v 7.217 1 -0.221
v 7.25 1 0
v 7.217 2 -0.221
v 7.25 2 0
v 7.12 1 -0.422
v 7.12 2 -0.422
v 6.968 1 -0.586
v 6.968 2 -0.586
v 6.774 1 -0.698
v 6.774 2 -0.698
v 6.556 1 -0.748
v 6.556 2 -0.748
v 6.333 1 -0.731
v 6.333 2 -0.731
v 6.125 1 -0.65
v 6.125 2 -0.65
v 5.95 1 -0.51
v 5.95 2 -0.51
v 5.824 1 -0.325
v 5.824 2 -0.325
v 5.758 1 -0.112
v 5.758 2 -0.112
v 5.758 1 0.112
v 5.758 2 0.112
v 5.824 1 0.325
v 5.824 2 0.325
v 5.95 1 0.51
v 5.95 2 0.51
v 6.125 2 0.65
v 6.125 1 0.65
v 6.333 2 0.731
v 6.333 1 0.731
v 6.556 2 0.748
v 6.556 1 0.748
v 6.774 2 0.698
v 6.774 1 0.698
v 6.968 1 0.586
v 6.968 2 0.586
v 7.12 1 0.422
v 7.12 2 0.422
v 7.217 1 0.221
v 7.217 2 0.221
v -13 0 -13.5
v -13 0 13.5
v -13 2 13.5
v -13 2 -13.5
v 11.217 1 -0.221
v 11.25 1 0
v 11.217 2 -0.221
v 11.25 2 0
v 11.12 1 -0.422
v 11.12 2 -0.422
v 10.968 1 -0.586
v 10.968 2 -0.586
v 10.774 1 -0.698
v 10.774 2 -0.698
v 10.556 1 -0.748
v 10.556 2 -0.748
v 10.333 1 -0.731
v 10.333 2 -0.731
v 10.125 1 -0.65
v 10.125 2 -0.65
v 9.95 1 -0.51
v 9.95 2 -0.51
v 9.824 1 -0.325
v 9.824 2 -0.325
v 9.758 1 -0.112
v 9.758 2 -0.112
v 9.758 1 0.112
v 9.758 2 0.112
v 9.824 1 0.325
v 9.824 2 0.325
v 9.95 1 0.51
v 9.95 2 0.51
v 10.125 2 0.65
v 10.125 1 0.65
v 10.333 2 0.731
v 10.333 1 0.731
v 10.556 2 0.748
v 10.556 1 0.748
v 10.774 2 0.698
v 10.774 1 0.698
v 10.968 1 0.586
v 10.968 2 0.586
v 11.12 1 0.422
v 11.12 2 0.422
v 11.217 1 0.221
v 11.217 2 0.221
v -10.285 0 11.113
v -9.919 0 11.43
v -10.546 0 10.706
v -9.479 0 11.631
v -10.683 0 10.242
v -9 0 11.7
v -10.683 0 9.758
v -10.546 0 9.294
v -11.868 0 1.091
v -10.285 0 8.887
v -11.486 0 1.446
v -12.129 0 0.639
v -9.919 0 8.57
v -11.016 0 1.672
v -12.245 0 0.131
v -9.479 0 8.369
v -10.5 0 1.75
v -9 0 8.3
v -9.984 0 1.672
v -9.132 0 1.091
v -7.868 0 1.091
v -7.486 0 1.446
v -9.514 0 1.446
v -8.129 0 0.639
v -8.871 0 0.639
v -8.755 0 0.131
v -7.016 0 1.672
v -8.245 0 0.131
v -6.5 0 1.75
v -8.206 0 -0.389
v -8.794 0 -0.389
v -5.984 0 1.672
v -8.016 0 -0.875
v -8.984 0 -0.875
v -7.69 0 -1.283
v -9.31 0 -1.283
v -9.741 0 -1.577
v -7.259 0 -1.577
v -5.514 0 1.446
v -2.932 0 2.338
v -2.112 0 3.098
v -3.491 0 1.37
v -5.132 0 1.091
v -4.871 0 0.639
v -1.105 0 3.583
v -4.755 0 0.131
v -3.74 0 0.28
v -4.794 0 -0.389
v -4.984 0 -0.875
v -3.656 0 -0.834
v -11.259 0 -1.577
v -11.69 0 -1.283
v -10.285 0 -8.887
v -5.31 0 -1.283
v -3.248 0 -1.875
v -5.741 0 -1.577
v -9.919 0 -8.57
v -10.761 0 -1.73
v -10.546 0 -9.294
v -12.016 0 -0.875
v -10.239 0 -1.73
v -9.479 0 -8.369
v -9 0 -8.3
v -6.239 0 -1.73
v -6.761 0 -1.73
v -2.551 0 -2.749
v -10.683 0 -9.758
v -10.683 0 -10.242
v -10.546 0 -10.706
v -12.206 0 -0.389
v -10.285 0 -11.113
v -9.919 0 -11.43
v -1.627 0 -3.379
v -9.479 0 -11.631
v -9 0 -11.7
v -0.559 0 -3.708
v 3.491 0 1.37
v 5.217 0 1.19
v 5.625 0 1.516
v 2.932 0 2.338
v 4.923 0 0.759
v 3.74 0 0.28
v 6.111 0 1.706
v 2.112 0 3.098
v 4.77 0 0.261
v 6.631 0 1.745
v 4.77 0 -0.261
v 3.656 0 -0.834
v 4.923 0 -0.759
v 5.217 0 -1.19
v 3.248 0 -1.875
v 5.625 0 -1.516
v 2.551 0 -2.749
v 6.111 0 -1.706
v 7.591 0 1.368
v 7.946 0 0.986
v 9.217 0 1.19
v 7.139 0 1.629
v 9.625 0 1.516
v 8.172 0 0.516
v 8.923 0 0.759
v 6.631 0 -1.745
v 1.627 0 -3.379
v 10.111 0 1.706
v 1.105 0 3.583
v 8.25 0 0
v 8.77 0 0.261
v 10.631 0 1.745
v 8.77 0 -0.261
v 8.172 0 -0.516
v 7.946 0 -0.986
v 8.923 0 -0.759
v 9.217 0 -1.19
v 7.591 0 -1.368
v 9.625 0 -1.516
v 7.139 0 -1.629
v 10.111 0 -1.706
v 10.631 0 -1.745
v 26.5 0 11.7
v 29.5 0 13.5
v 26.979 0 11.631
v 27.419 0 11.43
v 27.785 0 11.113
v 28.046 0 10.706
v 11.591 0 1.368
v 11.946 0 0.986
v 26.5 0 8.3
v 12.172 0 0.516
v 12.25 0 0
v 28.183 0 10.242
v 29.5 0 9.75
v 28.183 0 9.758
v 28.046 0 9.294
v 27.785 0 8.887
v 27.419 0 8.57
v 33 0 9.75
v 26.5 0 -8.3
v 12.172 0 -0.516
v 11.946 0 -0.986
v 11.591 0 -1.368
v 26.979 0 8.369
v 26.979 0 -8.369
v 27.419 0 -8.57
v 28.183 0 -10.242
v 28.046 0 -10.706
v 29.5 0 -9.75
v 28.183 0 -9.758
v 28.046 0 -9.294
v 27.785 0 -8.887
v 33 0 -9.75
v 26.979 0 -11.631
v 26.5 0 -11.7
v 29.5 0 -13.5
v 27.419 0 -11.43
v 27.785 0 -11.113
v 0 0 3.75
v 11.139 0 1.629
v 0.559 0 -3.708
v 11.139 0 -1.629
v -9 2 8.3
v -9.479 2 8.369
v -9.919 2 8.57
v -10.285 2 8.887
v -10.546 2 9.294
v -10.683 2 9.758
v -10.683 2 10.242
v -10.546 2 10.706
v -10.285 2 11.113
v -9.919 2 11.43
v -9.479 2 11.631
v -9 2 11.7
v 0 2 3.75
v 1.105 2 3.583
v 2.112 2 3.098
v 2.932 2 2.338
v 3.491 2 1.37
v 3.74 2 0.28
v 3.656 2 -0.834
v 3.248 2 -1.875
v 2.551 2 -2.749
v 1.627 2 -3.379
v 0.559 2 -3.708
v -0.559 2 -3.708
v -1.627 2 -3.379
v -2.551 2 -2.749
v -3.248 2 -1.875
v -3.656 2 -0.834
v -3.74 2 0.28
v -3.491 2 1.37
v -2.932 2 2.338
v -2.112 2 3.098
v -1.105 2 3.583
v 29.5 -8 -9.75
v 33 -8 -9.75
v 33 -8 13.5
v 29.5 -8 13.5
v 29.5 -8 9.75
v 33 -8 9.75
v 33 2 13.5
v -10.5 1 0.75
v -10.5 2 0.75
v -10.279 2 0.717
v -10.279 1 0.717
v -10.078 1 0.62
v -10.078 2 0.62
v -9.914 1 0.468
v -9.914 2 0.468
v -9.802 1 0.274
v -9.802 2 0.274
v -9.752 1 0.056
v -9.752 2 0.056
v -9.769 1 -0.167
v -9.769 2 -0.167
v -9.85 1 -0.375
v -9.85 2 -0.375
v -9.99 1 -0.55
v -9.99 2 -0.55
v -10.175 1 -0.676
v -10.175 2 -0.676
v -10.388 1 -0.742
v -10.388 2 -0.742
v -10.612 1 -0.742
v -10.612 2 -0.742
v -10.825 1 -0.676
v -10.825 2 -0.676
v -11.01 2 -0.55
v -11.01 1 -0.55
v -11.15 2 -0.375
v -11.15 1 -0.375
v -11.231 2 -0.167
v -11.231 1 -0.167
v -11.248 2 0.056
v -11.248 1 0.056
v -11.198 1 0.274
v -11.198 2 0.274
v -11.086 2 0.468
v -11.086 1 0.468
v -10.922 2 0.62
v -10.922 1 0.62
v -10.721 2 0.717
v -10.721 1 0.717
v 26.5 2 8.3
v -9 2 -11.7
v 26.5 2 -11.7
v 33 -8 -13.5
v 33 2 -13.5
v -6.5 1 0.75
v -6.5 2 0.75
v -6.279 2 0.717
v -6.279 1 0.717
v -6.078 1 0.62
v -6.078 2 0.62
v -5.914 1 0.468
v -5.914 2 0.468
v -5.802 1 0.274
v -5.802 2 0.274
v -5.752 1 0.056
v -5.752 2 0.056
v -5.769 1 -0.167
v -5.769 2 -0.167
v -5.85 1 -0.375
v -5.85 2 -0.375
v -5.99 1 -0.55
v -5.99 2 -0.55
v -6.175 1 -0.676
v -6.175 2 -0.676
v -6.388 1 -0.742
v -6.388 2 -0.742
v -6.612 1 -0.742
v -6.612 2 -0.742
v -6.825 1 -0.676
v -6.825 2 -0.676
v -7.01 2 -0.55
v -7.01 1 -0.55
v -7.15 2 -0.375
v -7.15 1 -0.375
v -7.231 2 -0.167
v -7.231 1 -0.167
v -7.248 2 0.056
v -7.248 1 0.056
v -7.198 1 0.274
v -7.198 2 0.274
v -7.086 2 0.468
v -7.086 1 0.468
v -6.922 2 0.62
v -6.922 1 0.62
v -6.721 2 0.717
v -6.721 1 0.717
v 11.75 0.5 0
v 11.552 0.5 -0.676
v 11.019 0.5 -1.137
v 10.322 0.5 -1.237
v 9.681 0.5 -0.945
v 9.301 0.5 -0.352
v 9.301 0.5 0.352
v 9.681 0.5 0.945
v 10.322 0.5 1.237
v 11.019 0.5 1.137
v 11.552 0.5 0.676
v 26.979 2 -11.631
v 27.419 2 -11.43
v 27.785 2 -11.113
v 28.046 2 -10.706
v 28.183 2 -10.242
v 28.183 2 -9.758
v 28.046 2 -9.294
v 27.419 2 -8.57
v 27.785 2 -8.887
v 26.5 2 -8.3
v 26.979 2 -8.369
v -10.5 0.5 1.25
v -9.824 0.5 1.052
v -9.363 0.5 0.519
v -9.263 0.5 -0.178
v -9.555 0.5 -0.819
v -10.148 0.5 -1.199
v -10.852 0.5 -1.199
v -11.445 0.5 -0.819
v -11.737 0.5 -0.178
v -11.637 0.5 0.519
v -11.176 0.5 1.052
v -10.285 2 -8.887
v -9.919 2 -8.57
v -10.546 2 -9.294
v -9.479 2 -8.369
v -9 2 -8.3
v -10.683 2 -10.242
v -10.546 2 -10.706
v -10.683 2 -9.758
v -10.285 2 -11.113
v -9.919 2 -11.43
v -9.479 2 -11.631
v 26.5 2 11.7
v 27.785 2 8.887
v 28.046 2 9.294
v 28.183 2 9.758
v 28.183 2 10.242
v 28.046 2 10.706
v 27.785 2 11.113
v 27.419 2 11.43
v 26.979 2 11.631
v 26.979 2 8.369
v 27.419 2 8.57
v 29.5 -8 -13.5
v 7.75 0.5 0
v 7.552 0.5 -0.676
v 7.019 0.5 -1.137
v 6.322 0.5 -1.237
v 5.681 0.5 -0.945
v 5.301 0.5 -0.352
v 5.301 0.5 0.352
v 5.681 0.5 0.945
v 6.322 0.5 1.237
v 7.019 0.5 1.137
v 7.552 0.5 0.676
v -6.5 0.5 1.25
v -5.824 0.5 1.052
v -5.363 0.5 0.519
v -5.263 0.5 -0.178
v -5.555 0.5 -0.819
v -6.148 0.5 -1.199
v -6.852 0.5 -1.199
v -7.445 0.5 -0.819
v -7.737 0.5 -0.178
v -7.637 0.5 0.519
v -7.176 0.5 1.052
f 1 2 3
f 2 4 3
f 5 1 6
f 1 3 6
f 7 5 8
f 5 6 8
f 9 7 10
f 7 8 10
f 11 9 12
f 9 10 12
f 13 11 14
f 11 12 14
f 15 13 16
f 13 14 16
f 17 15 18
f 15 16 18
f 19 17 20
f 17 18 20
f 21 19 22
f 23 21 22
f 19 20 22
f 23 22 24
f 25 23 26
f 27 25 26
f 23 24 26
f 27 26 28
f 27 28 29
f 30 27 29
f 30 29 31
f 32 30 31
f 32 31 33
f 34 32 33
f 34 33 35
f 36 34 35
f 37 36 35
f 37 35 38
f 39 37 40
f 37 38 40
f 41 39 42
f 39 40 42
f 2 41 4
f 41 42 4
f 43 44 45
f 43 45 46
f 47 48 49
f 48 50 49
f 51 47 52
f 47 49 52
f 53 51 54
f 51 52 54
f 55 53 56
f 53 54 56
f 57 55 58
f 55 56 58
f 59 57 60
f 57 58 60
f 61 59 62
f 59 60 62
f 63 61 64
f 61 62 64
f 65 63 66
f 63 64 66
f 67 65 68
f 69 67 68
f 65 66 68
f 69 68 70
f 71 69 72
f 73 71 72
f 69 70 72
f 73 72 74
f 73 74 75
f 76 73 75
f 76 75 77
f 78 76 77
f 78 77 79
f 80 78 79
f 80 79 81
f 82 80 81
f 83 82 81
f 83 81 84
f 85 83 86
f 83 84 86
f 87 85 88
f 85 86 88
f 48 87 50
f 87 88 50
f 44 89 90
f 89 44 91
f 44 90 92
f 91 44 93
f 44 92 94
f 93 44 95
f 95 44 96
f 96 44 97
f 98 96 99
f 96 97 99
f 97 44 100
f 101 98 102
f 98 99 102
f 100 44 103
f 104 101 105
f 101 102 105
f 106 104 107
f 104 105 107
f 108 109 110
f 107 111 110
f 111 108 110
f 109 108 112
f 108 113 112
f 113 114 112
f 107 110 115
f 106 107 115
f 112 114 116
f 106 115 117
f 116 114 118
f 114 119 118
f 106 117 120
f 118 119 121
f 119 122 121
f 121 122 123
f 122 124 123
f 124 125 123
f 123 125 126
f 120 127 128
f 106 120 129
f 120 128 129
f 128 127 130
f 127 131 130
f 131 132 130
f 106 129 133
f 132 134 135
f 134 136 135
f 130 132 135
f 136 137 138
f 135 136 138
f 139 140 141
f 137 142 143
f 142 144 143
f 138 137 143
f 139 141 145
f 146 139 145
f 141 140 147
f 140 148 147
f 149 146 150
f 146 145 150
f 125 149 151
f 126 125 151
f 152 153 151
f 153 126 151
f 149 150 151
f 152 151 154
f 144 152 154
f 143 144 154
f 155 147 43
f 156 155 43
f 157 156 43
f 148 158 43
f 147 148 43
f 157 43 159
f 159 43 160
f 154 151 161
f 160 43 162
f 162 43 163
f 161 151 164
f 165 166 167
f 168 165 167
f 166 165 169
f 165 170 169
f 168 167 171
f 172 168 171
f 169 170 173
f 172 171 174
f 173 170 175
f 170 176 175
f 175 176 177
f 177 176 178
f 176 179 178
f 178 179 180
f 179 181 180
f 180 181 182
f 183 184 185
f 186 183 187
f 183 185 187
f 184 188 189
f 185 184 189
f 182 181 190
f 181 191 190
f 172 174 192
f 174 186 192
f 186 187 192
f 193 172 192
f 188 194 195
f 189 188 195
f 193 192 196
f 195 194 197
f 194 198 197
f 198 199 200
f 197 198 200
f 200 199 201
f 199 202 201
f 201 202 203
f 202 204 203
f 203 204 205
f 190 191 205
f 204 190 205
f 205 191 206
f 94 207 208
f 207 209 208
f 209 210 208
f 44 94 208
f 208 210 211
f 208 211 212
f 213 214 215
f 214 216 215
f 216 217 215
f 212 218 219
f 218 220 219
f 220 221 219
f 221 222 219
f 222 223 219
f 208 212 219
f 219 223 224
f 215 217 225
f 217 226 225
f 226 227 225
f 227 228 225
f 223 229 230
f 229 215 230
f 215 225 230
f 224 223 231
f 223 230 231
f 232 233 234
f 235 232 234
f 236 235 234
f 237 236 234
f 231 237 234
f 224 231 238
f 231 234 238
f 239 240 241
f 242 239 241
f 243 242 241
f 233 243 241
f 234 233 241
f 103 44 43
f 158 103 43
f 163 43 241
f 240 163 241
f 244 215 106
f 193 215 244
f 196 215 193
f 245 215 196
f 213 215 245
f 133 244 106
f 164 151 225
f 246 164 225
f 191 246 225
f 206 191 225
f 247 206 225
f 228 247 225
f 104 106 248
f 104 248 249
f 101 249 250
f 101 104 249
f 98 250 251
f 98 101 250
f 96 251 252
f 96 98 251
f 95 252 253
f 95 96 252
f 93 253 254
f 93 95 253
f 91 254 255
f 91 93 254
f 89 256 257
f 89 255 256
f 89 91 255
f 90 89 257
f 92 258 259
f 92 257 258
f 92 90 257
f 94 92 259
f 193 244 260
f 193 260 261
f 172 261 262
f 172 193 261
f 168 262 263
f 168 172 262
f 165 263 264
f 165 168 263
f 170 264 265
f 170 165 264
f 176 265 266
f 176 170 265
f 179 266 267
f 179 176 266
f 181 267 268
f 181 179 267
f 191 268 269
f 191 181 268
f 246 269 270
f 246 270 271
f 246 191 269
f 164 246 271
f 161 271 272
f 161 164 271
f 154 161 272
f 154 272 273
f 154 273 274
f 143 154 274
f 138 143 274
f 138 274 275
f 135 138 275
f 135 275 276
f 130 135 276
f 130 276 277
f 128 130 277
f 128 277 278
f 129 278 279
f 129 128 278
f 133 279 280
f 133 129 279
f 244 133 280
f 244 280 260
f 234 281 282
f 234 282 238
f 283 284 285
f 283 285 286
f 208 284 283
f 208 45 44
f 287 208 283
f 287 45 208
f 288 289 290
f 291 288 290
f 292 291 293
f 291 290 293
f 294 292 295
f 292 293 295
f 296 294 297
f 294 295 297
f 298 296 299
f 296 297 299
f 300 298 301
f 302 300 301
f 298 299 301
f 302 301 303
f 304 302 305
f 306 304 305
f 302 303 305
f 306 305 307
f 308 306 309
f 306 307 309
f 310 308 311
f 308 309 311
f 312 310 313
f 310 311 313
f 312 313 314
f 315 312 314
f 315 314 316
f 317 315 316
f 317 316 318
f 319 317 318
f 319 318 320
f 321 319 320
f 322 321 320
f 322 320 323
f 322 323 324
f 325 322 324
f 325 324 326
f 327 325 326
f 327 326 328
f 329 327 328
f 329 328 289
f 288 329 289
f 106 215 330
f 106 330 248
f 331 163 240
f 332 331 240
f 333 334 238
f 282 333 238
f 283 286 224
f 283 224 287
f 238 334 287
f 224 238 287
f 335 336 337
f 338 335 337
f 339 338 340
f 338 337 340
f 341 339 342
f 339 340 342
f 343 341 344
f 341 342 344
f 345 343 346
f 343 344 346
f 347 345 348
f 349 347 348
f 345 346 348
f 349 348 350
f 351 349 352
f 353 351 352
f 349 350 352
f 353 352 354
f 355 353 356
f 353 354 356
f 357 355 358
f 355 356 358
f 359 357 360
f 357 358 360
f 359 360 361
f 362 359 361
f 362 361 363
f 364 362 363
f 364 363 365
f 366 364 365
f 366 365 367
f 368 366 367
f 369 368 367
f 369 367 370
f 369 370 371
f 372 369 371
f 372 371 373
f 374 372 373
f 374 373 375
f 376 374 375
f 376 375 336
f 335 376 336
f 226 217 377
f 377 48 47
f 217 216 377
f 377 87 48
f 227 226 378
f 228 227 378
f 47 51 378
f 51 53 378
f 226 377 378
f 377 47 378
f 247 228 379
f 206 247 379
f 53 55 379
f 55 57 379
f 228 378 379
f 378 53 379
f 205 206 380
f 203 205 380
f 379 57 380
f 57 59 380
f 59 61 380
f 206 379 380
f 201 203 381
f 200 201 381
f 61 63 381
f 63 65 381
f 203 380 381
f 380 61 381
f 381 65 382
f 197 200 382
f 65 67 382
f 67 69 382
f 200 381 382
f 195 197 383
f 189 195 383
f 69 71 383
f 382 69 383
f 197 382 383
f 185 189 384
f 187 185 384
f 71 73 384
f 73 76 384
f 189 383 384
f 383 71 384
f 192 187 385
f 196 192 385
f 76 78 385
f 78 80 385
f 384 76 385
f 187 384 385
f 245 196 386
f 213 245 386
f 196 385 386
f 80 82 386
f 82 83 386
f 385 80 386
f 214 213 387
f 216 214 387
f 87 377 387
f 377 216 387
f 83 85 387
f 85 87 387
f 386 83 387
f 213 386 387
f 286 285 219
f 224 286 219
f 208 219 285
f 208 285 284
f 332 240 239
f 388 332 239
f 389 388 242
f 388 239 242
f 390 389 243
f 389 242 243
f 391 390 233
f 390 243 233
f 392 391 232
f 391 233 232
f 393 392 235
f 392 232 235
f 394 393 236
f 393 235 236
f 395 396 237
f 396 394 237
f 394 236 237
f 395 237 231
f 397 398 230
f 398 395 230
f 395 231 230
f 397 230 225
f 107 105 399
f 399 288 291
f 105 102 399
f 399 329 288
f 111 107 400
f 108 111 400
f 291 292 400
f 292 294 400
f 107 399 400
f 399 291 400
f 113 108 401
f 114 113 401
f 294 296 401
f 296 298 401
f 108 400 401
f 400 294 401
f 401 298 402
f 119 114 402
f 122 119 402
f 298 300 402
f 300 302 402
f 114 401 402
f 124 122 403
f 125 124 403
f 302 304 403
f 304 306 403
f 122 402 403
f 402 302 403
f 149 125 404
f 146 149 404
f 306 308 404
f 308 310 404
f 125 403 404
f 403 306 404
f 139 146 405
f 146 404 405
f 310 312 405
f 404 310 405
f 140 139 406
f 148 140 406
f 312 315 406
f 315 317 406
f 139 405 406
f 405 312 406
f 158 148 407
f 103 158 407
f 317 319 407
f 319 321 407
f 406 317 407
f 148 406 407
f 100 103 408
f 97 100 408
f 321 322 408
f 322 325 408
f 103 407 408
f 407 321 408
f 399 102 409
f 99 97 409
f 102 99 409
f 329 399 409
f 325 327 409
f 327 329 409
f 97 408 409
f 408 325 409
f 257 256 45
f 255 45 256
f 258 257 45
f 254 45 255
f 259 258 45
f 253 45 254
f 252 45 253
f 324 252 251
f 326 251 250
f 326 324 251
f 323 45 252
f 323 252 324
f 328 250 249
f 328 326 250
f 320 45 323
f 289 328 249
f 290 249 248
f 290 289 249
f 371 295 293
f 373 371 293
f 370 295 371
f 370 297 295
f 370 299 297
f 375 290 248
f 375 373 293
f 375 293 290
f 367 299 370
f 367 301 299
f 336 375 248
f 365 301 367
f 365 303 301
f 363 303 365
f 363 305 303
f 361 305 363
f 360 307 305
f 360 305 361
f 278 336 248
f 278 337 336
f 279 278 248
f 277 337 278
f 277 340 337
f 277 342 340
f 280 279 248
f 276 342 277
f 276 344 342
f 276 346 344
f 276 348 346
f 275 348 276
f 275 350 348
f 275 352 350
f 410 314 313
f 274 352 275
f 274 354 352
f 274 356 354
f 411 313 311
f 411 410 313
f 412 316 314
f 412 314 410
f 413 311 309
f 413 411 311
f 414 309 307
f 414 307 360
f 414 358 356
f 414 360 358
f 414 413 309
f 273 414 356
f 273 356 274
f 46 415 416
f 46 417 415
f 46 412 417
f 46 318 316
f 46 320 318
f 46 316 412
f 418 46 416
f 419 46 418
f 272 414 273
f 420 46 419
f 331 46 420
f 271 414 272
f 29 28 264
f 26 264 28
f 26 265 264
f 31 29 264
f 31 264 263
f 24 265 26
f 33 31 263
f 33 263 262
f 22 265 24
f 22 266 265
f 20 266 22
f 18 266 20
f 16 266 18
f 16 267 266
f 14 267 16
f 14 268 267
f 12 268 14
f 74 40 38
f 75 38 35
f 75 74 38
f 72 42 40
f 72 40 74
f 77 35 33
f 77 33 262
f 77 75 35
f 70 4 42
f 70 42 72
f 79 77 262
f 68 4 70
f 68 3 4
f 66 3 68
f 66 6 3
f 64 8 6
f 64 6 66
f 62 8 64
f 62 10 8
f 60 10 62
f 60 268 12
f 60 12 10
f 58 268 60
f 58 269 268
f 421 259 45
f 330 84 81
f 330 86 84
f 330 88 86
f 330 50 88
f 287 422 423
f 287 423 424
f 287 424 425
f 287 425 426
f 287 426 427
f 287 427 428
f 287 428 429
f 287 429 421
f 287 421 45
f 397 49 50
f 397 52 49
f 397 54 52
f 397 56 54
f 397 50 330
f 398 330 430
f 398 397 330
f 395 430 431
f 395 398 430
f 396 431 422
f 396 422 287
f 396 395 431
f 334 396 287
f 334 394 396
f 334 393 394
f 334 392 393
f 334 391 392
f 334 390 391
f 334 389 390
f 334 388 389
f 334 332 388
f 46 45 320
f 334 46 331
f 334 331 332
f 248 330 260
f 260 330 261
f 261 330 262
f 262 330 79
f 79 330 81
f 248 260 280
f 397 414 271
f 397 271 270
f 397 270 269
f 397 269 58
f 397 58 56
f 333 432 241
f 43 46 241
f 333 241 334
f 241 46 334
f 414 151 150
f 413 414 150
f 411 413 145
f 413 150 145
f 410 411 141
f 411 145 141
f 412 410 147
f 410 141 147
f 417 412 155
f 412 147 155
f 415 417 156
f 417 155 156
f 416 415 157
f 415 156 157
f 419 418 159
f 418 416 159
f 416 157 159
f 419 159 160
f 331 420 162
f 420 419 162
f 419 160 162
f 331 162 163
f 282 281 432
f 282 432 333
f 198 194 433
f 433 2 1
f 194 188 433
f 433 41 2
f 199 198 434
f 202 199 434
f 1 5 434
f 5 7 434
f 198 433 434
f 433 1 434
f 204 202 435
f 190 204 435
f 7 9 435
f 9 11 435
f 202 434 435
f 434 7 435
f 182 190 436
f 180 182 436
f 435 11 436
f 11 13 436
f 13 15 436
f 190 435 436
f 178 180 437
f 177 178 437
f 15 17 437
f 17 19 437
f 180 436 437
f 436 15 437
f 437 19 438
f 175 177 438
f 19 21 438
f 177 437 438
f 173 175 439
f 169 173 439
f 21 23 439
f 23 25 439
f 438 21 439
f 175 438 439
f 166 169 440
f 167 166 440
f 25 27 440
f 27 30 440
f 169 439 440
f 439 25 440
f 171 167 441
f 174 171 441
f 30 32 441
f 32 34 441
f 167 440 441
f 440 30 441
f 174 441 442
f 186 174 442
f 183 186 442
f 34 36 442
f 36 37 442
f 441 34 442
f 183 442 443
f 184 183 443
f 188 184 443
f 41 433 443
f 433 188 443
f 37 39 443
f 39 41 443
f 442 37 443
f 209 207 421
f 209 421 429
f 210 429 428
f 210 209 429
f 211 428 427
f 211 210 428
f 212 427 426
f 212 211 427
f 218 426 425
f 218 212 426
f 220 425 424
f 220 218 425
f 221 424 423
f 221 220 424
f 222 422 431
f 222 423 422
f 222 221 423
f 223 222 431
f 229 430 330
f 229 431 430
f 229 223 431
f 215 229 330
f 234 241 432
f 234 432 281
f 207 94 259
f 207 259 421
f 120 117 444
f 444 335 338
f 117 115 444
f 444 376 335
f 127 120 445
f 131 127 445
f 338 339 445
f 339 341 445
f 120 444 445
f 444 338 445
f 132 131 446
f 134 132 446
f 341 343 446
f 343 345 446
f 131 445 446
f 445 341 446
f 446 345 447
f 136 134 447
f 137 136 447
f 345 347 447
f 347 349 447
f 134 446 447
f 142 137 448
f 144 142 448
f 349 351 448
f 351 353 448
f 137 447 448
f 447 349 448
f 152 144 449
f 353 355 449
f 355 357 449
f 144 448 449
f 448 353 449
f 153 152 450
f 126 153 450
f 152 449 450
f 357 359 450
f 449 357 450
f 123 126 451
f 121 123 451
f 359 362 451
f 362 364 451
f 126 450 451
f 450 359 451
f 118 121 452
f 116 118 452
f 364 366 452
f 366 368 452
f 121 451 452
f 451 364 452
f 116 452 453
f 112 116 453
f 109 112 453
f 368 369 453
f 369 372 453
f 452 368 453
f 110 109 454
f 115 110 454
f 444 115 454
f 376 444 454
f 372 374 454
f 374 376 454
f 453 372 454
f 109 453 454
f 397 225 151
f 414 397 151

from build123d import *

# Parameters (mm, degrees)
SKETCH1_W                  = 46
SKETCH1_H                  = 27
SKETCH1_R                  = 3.75
BOSS_EXTRUDE1_DEPTH        = 2
SKETCH7_W                  = 3.5
SKETCH7_H                  = 27
BOSS_EXTRUDE4_DEPTH        = 8
CUT_EXTRUDE3_REACH         = 47.305
SKETCH8_W                  = 19.5
SKETCH8_H                  = 8
CUT_EXTRUDE4_REACH         = 38.541
CUT_EXTRUDE5_REACH         = 39.03
SKETCH10_R                 = 0.75
CHAMFER1_SIZE              = 1
LPATTERN1_COUNT            = 2
LPATTERN1_PITCH            = 4
CHAMFER1_OF_LPATTERN1_SIZE = 1


# Read off the part's stored shape, not the designer's step: Mirror2
with BuildPart() as part:
    # Sketch1 → Boss-Extrude1 (new body)
    with BuildSketch(Plane(origin=(0, 0, 0), x_dir=(1, 0, 0), z_dir=(0, 1, 0))):
        with Locations((10, 0)):
            Rectangle(SKETCH1_W, SKETCH1_H)
        with Locations(Location((0, 0, 0), (0, 0, 270))):
            Circle(SKETCH1_R, mode=Mode.SUBTRACT)
    extrude(amount=BOSS_EXTRUDE1_DEPTH)

    # Sketch7 → Boss-Extrude4 (add)
    with BuildSketch(Plane.XZ):
        with Locations((31.25, 0)):
            Rectangle(SKETCH7_W, SKETCH7_H)
    extrude(amount=BOSS_EXTRUDE4_DEPTH)

    # Sketch8 → Cut-Extrude3 (cut, up to next)
    with BuildSketch(Plane.ZY.offset(-29.5), mode=Mode.PRIVATE) as cut_extrude3_sk1:
        with Locations((0, -4)):
            Rectangle(SKETCH8_W, SKETCH8_H)
    cut_extrude3_tool1 = extrude(cut_extrude3_sk1.sketch, amount=-CUT_EXTRUDE3_REACH, mode=Mode.PRIVATE) & part.part
    add(cut_extrude3_tool1.solids().sort_by_distance((29.5, -4, 0))[0], mode=Mode.SUBTRACT)

    # Sketch9 → Cut-Extrude4 (cut, up to next)
    with BuildSketch(Plane.XZ, mode=Mode.PRIVATE) as cut_extrude4_sk1:
        with BuildLine():
            Line((-9, 11.7), (26.5, 11.7))
            ThreePointArc((26.5, 11.7), (28.2, 10), (26.5, 8.3))
            Line((26.5, 8.3), (-9, 8.3))
            ThreePointArc((-9, 8.3), (-10.7, 10), (-9, 11.7))
        make_face()
    cut_extrude4_tool1 = extrude(cut_extrude4_sk1.sketch, amount=-CUT_EXTRUDE4_REACH, mode=Mode.PRIVATE) & part.part
    cut_extrude4 = cut_extrude4_tool1.solids().sort_by_distance((8.75, 0, 10))[0]
    add(cut_extrude4, mode=Mode.SUBTRACT)

    # Mirror1: Cut-Extrude4 across plane
    add(cut_extrude4.mirror(Plane.XY), mode=Mode.SUBTRACT)

    # Sketch10 → Cut-Extrude5 (cut, up to next)
    with BuildSketch(Plane(origin=(0, 2, 0), x_dir=(1, 0, 0), z_dir=(0, 1, 0)), mode=Mode.PRIVATE) as cut_extrude5_sk1:
        with Locations(Location((-6.5, 0, 0), (0, 0, 270))):
            Circle(SKETCH10_R)
    cut_extrude5_tool1 = extrude(cut_extrude5_sk1.sketch, amount=-CUT_EXTRUDE5_REACH, mode=Mode.PRIVATE) & part.part
    cut_extrude5 = cut_extrude5_tool1.solids().sort_by_distance((-6.5, 2, 0))[0]
    add(cut_extrude5, mode=Mode.SUBTRACT)

    # Chamfer1
    chamfer1_edges = [part.edges().sort_by_distance(p)[0] for p in [
        (-6.5, 0, -0.75),
    ]]
    chamfer(chamfer1_edges, length=CHAMFER1_SIZE)

    # LPattern1: Cut-Extrude5 ×2
    with Locations(*[(-i * LPATTERN1_PITCH, 0, 0) for i in range(1, LPATTERN1_COUNT)]):
        add(cut_extrude5, mode=Mode.SUBTRACT)

    # Chamfer1 of LPattern1
    chamfer1_of_lpattern1_edges = [part.edges().sort_by_distance(p)[0] for p in [
        (-10.5, 0, -0.75),
    ]]
    chamfer(chamfer1_of_lpattern1_edges, length=CHAMFER1_OF_LPATTERN1_SIZE)

    # Mirror2 outline → Mirror2 (revolve, cut)
    with BuildSketch(Plane(origin=(6.5, 0, 0), x_dir=(1, 0, 0), z_dir=(0, 0, 1))):
        Polygon((0, 0), (1.75, 0), (0.75, 1), (0.75, 2), (0, 2), align=None)
    revolve(axis=Axis((6.5, 0, 0), (0, 1, 0)), mode=Mode.SUBTRACT)

    # Mirror2 2 outline → Mirror2 2 (revolve, cut)
    with BuildSketch(Plane(origin=(10.5, 0, 0), x_dir=(1, 0, 0), z_dir=(0, 0, 1))):
        Polygon((0, 0), (1.75, 0), (0.75, 1), (0.75, 2), (0, 2), align=None)
    revolve(axis=Axis((10.5, 0, 0), (0, 1, 0)), mode=Mode.SUBTRACT)


solid = part.part
